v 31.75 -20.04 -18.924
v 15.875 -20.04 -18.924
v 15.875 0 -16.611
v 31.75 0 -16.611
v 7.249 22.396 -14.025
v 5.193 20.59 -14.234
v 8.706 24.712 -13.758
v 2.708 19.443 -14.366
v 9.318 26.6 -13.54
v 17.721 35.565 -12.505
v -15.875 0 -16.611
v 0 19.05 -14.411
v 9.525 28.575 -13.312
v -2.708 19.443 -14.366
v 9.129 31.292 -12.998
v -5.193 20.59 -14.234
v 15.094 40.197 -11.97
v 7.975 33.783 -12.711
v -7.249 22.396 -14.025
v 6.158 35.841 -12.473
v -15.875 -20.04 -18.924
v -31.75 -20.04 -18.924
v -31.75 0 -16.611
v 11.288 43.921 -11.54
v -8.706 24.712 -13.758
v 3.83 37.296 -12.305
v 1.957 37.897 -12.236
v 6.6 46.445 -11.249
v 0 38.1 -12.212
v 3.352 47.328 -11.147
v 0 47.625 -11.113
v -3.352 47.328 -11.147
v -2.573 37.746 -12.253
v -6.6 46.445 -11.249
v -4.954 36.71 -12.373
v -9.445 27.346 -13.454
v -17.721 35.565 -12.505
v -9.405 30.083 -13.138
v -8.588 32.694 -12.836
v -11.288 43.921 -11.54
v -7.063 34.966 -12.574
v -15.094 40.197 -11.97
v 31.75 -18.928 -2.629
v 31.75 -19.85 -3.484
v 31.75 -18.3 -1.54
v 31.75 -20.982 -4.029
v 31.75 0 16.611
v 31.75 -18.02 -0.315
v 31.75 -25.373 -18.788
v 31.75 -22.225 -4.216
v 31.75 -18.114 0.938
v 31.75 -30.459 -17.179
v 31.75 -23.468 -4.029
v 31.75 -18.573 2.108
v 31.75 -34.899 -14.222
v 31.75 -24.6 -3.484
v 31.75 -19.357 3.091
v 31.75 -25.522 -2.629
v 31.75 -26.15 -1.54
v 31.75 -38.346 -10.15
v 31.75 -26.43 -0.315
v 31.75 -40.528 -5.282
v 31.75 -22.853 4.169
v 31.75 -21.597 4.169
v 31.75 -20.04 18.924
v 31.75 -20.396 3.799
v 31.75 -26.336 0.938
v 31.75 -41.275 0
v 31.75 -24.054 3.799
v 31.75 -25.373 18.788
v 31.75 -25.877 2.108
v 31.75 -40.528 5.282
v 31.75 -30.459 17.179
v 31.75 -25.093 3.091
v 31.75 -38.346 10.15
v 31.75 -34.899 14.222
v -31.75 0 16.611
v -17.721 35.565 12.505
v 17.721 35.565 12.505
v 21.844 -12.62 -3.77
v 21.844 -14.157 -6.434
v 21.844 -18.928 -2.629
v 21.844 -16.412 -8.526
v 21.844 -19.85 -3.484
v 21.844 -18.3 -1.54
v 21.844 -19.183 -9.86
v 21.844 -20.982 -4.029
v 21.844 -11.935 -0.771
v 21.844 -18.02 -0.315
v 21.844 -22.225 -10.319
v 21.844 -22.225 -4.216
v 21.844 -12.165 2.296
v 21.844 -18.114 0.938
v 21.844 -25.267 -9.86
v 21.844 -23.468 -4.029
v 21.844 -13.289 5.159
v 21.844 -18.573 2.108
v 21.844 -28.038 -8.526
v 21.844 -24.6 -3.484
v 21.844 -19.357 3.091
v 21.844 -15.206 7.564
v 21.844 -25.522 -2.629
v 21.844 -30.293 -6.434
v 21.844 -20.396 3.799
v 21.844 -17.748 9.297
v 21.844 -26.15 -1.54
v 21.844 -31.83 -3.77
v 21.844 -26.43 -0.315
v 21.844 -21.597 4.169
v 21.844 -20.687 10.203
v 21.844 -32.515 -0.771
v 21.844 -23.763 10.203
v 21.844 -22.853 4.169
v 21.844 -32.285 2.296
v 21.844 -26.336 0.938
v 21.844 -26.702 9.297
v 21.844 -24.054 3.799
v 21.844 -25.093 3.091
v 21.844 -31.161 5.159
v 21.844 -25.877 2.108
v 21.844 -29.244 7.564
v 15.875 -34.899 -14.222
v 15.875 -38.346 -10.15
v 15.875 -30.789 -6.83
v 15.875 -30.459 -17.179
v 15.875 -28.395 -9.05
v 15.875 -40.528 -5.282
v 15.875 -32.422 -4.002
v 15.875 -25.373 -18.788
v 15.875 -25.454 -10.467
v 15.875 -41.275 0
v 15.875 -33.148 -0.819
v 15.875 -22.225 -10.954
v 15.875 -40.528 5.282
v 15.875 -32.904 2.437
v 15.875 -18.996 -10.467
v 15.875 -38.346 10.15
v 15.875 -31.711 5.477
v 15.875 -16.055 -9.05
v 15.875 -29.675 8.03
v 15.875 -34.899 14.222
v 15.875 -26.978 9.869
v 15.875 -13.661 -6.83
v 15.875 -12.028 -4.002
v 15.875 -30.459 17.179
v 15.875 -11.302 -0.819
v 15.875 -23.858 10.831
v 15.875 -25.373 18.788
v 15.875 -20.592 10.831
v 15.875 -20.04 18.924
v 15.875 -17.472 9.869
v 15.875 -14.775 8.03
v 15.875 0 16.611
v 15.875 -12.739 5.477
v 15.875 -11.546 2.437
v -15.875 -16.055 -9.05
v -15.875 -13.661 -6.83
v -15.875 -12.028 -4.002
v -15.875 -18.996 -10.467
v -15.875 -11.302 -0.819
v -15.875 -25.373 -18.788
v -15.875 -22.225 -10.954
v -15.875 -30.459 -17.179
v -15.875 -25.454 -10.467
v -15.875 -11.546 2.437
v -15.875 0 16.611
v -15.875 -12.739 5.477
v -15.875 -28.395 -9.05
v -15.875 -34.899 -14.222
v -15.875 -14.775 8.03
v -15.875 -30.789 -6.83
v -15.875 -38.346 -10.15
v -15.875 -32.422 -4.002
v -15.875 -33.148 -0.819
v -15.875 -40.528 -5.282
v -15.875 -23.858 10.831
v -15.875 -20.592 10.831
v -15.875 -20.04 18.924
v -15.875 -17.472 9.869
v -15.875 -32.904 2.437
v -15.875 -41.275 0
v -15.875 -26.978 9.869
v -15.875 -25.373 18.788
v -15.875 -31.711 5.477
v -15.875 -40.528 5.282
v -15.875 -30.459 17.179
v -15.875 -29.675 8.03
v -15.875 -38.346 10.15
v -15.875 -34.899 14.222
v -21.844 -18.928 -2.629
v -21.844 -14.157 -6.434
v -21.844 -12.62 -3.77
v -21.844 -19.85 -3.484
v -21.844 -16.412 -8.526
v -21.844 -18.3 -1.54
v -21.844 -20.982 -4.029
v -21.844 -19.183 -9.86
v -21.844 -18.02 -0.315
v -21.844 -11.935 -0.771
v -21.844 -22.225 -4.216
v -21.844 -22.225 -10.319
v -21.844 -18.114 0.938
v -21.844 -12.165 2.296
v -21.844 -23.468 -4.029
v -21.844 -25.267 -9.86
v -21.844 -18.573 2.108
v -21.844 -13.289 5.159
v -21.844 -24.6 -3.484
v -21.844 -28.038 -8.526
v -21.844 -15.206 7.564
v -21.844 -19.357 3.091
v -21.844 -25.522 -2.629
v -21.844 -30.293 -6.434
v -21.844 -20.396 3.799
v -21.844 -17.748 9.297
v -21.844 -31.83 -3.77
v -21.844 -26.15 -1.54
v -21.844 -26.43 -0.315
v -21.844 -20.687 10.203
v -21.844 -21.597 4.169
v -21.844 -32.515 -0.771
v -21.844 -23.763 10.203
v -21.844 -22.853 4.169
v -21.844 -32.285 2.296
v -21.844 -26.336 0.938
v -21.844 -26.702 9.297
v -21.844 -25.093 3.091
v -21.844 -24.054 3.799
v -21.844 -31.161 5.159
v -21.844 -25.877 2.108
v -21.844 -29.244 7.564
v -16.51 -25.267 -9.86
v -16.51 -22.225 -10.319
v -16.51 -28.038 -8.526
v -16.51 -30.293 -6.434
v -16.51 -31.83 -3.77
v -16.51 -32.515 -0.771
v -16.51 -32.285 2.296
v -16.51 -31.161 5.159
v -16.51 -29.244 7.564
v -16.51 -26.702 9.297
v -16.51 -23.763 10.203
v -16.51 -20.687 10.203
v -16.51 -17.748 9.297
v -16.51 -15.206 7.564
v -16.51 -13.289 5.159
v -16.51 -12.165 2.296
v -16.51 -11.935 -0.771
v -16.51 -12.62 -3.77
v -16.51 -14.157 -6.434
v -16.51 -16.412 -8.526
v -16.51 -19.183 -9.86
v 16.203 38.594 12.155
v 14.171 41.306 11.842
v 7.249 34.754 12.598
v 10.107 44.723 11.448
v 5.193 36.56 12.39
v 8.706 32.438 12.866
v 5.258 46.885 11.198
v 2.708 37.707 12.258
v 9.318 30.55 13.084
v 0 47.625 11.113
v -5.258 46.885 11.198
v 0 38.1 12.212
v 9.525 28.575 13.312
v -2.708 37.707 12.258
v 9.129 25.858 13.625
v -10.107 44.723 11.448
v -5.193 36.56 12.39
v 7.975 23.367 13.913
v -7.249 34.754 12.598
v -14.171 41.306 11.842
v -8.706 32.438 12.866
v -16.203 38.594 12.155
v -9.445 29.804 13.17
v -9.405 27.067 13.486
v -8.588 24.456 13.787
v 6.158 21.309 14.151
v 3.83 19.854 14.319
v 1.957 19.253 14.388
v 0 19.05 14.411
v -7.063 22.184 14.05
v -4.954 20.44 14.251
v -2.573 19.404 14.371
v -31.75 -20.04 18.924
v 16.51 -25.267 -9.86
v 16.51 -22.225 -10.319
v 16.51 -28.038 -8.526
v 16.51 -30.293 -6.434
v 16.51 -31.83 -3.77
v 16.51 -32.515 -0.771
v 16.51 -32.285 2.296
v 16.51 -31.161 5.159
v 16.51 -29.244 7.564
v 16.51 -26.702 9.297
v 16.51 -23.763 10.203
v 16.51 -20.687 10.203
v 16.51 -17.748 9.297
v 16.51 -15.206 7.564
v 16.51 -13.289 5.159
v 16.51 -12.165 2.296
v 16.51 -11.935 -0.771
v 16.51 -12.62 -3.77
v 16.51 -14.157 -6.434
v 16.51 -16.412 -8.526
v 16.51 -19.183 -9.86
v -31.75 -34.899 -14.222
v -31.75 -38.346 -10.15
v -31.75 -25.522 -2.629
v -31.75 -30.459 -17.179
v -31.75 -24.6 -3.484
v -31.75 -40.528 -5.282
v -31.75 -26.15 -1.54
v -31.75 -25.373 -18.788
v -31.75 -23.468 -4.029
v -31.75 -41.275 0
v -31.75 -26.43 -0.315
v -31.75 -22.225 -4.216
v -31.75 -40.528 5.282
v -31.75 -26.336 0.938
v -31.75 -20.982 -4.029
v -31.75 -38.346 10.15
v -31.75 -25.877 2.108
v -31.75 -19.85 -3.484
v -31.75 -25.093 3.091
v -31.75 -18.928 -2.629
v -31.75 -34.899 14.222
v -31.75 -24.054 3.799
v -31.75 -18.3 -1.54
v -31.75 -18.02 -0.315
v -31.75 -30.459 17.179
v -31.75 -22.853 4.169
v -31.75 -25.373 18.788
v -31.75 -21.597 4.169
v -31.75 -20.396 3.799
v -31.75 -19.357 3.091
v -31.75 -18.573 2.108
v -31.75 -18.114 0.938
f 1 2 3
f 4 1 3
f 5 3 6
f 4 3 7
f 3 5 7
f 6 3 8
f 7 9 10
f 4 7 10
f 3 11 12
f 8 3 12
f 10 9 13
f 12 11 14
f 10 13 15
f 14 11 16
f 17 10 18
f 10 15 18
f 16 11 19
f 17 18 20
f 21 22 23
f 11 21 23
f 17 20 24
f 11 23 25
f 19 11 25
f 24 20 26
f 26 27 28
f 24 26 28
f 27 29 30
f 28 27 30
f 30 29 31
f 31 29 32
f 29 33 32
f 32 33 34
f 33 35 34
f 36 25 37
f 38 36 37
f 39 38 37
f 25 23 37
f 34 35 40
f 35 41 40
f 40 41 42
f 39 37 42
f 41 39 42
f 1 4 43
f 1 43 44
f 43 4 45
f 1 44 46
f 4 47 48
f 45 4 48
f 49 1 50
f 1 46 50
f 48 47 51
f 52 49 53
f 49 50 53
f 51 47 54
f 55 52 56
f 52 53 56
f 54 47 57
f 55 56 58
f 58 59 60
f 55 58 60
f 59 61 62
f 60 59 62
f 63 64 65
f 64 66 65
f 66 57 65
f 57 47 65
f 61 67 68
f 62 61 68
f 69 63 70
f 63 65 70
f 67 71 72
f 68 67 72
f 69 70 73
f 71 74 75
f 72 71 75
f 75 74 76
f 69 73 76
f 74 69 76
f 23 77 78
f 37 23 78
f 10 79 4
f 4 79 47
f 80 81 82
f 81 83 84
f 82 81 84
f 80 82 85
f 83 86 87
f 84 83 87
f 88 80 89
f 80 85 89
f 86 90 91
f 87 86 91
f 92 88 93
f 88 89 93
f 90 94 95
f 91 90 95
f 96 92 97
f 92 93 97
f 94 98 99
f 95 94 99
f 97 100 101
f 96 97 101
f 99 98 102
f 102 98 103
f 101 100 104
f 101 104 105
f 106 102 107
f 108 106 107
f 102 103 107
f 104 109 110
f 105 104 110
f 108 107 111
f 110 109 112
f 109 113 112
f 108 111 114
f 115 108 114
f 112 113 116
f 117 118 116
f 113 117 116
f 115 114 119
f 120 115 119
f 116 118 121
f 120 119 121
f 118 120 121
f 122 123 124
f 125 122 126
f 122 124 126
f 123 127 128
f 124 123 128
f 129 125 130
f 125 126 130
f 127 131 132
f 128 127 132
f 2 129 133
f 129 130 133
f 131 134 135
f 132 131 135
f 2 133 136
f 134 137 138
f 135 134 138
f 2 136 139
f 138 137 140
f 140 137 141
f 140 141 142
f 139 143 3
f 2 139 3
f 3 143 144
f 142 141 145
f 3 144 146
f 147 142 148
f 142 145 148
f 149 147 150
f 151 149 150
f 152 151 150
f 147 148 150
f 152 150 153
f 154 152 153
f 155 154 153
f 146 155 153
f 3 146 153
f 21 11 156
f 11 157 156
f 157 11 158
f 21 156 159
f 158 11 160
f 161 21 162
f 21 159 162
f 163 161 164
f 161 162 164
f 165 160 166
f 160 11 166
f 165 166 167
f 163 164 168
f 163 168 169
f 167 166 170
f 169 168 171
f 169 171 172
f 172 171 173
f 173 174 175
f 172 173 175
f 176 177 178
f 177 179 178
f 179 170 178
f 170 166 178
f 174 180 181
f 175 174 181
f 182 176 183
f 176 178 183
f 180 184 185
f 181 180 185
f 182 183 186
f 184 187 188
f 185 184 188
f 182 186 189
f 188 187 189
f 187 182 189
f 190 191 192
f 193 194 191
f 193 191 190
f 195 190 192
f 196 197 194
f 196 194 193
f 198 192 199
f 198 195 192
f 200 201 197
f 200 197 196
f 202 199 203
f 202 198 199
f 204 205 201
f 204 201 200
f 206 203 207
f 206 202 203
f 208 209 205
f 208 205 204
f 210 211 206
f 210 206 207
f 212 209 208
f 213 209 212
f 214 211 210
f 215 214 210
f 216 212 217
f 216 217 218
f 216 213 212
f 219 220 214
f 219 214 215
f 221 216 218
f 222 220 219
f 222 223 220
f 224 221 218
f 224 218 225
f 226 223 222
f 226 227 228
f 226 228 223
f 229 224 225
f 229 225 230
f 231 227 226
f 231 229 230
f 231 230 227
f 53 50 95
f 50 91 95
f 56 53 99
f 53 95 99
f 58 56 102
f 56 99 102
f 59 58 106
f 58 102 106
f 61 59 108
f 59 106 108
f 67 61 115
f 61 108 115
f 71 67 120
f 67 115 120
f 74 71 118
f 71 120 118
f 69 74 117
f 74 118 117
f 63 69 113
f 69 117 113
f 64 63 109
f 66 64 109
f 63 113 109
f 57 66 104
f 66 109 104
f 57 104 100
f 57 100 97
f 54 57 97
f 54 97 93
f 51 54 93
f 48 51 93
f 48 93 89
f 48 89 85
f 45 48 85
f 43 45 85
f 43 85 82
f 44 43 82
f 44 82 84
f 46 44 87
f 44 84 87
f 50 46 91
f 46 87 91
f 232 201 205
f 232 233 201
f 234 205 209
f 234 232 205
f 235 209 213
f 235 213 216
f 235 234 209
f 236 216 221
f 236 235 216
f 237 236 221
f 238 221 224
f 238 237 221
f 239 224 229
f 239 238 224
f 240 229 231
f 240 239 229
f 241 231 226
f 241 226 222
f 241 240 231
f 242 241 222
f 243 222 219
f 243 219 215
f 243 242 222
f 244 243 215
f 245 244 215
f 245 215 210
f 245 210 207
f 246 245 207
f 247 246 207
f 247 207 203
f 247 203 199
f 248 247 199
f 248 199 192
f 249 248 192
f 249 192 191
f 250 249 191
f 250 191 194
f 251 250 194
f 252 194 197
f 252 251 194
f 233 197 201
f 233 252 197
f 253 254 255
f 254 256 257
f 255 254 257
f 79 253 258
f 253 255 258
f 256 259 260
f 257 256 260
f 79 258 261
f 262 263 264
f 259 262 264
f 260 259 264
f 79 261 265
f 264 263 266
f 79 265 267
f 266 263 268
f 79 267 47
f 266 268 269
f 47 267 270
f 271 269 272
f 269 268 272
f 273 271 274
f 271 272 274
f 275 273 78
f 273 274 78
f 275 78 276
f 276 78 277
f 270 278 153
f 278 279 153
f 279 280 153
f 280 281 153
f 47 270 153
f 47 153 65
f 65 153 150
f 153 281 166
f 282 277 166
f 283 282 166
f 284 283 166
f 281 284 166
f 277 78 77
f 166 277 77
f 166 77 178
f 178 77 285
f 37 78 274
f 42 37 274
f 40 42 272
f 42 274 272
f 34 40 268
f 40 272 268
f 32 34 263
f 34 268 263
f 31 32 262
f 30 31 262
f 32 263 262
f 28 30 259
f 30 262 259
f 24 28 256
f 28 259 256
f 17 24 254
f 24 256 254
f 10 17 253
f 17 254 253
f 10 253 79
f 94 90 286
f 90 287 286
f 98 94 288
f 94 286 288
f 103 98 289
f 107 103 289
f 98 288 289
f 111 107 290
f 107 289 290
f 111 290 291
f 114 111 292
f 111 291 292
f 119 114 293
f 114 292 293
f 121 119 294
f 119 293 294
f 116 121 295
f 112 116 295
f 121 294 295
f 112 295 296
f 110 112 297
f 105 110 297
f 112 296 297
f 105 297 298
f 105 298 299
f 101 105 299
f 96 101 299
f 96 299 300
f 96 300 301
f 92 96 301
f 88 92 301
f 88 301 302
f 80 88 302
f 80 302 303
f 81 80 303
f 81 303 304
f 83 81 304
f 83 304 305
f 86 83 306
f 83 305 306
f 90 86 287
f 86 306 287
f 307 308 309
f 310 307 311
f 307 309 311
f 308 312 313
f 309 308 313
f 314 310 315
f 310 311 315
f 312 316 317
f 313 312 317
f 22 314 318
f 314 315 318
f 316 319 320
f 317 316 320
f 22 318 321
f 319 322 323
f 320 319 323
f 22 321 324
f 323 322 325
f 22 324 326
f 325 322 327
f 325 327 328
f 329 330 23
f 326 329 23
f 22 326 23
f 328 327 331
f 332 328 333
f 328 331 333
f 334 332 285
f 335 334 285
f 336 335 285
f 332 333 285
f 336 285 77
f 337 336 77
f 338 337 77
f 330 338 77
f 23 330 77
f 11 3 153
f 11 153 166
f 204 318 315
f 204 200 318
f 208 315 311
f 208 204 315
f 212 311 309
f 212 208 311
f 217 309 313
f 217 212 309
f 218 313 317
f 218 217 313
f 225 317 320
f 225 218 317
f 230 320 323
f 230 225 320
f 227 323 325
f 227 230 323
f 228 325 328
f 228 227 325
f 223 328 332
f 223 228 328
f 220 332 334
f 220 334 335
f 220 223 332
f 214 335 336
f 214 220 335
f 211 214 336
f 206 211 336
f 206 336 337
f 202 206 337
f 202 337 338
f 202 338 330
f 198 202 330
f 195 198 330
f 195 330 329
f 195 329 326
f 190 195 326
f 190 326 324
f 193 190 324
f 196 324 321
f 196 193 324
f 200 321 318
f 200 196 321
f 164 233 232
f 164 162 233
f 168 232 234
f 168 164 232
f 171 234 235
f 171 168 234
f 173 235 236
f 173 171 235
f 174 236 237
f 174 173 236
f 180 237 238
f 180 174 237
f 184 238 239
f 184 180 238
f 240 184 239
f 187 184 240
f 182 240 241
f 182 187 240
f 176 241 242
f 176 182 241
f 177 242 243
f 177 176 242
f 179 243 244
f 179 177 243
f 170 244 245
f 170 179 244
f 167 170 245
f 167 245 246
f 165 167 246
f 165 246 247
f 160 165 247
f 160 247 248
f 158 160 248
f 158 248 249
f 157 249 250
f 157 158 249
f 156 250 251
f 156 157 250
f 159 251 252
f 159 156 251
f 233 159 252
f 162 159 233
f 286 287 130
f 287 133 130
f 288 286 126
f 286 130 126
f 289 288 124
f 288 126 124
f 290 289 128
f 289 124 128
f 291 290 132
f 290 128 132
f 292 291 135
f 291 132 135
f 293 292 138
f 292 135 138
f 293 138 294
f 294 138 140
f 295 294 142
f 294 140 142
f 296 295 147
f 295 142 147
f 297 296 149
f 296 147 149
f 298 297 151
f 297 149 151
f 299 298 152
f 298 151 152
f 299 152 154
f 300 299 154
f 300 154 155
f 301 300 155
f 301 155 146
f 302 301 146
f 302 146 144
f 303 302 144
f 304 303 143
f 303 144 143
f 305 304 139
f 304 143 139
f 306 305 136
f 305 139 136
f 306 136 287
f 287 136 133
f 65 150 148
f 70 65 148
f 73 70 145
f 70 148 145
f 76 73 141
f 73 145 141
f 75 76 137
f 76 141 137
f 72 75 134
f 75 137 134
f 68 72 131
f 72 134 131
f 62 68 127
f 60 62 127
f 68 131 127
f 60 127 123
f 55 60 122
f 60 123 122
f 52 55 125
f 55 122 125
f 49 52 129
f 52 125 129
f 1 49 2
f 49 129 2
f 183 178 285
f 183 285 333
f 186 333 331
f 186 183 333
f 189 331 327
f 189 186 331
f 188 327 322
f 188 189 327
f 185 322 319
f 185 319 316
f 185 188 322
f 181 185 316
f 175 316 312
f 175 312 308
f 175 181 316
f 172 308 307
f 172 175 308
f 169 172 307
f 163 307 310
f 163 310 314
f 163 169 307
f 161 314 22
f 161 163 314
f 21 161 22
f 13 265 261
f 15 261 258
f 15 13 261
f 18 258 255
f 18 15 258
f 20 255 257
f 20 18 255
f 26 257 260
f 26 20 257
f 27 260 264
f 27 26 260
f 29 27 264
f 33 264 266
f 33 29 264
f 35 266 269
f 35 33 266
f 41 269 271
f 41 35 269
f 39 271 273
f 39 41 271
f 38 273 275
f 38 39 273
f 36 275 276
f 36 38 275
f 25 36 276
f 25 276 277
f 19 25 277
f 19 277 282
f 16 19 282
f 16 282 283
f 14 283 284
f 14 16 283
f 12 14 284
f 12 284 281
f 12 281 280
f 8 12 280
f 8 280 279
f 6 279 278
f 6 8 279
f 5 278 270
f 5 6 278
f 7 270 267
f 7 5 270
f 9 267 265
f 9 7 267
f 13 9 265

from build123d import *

# Parameters (mm, degrees)
SKETCH1_R               = 9.525
BOSS_EXTRUDE1_DEPTH     = 19.05
SKETCH2_OUTSIDE_W       = 63.24
SKETCH2_OUTSIDE_H       = 114.04
CUT_EXTRUDE1_DEPTH      = 32.75
CUT_EXTRUDE1_DEPTH_BACK = 32.75


with BuildPart() as part:
    # Sketch1 → Boss-Extrude1 (new body, symmetric)
    with BuildSketch(Plane.XY):
        with BuildLine():
            Line((17.721167904, 35.565186559), (31.75, 0))
            Line((31.75, 0), (31.75, -41.275))
            Line((31.75, -41.275), (15.875, -41.275))
            Line((15.875, -41.275), (15.875, 0))
            Line((15.875, 0), (-15.875, 0))
            Line((-15.875, 0), (-15.875, -41.275))
            Line((-15.875, -41.275), (-31.75, -41.275))
            Line((-31.75, -41.275), (-31.75, 0))
            Line((-31.75, 0), (-17.721167904, 35.565186559))
            ThreePointArc((-17.721167904, 35.565186559), (0, 47.625), (17.721167904, 35.565186559))
        make_face()
        with Locations((0, 28.575)):
            Circle(SKETCH1_R, mode=Mode.SUBTRACT)
    extrude(amount=BOSS_EXTRUDE1_DEPTH, both=True)

    # Sketch2 outside → Cut-Extrude1 (cut, two sides)
    with BuildSketch(Plane(origin=(0, 0, 0), x_dir=(0, 0, -1), z_dir=(1, 0, 0))) as cut_extrude1_sk:
        with Locations((0, 3.175)):
            Rectangle(SKETCH2_OUTSIDE_W, SKETCH2_OUTSIDE_H)
        with BuildLine():
            Line((18.924303972, -20.040230177), (11.1125, 47.625))
            Line((11.1125, 47.625), (-11.1125, 47.625))
            Line((-11.1125, 47.625), (-18.924303972, -20.040230177))
            ThreePointArc((-18.924303972, -20.040230177), (0, -41.275), (18.924303972, -20.040230177))
        make_face(mode=Mode.SUBTRACT)
    extrude(amount=CUT_EXTRUDE1_DEPTH, mode=Mode.SUBTRACT)
    extrude(cut_extrude1_sk.sketch, amount=-CUT_EXTRUDE1_DEPTH_BACK, mode=Mode.SUBTRACT)

    # Sketch6 → CBORE for 5/16 Hex Head Bolt2 (revolve, cut)
    with BuildSketch(Plane(origin=(-15.875, -22.225, 0), x_dir=(0, 0, -1), z_dir=(0, 1, 0))):
        Polygon((0, 0), (0, 15.875), (4.2164, 15.875), (4.2164, 5.969), (10.31875, 5.969), (10.31875, 0.635), (10.95375, 0), align=None)
    cbore_for_5_16_hex_head_bolt2 = revolve(axis=Axis((-9.525, -22.225, 0), (-1, 0, 0)), mode=Mode.SUBTRACT)

    # Mirror1: CBORE for 5/16 Hex Head Bolt2 across plane
    add(cbore_for_5_16_hex_head_bolt2.mirror(Plane(origin=(0, 0, 0), x_dir=(0, 0, 1), z_dir=(1, 0, 0))), mode=Mode.SUBTRACT)


solid = part.part
